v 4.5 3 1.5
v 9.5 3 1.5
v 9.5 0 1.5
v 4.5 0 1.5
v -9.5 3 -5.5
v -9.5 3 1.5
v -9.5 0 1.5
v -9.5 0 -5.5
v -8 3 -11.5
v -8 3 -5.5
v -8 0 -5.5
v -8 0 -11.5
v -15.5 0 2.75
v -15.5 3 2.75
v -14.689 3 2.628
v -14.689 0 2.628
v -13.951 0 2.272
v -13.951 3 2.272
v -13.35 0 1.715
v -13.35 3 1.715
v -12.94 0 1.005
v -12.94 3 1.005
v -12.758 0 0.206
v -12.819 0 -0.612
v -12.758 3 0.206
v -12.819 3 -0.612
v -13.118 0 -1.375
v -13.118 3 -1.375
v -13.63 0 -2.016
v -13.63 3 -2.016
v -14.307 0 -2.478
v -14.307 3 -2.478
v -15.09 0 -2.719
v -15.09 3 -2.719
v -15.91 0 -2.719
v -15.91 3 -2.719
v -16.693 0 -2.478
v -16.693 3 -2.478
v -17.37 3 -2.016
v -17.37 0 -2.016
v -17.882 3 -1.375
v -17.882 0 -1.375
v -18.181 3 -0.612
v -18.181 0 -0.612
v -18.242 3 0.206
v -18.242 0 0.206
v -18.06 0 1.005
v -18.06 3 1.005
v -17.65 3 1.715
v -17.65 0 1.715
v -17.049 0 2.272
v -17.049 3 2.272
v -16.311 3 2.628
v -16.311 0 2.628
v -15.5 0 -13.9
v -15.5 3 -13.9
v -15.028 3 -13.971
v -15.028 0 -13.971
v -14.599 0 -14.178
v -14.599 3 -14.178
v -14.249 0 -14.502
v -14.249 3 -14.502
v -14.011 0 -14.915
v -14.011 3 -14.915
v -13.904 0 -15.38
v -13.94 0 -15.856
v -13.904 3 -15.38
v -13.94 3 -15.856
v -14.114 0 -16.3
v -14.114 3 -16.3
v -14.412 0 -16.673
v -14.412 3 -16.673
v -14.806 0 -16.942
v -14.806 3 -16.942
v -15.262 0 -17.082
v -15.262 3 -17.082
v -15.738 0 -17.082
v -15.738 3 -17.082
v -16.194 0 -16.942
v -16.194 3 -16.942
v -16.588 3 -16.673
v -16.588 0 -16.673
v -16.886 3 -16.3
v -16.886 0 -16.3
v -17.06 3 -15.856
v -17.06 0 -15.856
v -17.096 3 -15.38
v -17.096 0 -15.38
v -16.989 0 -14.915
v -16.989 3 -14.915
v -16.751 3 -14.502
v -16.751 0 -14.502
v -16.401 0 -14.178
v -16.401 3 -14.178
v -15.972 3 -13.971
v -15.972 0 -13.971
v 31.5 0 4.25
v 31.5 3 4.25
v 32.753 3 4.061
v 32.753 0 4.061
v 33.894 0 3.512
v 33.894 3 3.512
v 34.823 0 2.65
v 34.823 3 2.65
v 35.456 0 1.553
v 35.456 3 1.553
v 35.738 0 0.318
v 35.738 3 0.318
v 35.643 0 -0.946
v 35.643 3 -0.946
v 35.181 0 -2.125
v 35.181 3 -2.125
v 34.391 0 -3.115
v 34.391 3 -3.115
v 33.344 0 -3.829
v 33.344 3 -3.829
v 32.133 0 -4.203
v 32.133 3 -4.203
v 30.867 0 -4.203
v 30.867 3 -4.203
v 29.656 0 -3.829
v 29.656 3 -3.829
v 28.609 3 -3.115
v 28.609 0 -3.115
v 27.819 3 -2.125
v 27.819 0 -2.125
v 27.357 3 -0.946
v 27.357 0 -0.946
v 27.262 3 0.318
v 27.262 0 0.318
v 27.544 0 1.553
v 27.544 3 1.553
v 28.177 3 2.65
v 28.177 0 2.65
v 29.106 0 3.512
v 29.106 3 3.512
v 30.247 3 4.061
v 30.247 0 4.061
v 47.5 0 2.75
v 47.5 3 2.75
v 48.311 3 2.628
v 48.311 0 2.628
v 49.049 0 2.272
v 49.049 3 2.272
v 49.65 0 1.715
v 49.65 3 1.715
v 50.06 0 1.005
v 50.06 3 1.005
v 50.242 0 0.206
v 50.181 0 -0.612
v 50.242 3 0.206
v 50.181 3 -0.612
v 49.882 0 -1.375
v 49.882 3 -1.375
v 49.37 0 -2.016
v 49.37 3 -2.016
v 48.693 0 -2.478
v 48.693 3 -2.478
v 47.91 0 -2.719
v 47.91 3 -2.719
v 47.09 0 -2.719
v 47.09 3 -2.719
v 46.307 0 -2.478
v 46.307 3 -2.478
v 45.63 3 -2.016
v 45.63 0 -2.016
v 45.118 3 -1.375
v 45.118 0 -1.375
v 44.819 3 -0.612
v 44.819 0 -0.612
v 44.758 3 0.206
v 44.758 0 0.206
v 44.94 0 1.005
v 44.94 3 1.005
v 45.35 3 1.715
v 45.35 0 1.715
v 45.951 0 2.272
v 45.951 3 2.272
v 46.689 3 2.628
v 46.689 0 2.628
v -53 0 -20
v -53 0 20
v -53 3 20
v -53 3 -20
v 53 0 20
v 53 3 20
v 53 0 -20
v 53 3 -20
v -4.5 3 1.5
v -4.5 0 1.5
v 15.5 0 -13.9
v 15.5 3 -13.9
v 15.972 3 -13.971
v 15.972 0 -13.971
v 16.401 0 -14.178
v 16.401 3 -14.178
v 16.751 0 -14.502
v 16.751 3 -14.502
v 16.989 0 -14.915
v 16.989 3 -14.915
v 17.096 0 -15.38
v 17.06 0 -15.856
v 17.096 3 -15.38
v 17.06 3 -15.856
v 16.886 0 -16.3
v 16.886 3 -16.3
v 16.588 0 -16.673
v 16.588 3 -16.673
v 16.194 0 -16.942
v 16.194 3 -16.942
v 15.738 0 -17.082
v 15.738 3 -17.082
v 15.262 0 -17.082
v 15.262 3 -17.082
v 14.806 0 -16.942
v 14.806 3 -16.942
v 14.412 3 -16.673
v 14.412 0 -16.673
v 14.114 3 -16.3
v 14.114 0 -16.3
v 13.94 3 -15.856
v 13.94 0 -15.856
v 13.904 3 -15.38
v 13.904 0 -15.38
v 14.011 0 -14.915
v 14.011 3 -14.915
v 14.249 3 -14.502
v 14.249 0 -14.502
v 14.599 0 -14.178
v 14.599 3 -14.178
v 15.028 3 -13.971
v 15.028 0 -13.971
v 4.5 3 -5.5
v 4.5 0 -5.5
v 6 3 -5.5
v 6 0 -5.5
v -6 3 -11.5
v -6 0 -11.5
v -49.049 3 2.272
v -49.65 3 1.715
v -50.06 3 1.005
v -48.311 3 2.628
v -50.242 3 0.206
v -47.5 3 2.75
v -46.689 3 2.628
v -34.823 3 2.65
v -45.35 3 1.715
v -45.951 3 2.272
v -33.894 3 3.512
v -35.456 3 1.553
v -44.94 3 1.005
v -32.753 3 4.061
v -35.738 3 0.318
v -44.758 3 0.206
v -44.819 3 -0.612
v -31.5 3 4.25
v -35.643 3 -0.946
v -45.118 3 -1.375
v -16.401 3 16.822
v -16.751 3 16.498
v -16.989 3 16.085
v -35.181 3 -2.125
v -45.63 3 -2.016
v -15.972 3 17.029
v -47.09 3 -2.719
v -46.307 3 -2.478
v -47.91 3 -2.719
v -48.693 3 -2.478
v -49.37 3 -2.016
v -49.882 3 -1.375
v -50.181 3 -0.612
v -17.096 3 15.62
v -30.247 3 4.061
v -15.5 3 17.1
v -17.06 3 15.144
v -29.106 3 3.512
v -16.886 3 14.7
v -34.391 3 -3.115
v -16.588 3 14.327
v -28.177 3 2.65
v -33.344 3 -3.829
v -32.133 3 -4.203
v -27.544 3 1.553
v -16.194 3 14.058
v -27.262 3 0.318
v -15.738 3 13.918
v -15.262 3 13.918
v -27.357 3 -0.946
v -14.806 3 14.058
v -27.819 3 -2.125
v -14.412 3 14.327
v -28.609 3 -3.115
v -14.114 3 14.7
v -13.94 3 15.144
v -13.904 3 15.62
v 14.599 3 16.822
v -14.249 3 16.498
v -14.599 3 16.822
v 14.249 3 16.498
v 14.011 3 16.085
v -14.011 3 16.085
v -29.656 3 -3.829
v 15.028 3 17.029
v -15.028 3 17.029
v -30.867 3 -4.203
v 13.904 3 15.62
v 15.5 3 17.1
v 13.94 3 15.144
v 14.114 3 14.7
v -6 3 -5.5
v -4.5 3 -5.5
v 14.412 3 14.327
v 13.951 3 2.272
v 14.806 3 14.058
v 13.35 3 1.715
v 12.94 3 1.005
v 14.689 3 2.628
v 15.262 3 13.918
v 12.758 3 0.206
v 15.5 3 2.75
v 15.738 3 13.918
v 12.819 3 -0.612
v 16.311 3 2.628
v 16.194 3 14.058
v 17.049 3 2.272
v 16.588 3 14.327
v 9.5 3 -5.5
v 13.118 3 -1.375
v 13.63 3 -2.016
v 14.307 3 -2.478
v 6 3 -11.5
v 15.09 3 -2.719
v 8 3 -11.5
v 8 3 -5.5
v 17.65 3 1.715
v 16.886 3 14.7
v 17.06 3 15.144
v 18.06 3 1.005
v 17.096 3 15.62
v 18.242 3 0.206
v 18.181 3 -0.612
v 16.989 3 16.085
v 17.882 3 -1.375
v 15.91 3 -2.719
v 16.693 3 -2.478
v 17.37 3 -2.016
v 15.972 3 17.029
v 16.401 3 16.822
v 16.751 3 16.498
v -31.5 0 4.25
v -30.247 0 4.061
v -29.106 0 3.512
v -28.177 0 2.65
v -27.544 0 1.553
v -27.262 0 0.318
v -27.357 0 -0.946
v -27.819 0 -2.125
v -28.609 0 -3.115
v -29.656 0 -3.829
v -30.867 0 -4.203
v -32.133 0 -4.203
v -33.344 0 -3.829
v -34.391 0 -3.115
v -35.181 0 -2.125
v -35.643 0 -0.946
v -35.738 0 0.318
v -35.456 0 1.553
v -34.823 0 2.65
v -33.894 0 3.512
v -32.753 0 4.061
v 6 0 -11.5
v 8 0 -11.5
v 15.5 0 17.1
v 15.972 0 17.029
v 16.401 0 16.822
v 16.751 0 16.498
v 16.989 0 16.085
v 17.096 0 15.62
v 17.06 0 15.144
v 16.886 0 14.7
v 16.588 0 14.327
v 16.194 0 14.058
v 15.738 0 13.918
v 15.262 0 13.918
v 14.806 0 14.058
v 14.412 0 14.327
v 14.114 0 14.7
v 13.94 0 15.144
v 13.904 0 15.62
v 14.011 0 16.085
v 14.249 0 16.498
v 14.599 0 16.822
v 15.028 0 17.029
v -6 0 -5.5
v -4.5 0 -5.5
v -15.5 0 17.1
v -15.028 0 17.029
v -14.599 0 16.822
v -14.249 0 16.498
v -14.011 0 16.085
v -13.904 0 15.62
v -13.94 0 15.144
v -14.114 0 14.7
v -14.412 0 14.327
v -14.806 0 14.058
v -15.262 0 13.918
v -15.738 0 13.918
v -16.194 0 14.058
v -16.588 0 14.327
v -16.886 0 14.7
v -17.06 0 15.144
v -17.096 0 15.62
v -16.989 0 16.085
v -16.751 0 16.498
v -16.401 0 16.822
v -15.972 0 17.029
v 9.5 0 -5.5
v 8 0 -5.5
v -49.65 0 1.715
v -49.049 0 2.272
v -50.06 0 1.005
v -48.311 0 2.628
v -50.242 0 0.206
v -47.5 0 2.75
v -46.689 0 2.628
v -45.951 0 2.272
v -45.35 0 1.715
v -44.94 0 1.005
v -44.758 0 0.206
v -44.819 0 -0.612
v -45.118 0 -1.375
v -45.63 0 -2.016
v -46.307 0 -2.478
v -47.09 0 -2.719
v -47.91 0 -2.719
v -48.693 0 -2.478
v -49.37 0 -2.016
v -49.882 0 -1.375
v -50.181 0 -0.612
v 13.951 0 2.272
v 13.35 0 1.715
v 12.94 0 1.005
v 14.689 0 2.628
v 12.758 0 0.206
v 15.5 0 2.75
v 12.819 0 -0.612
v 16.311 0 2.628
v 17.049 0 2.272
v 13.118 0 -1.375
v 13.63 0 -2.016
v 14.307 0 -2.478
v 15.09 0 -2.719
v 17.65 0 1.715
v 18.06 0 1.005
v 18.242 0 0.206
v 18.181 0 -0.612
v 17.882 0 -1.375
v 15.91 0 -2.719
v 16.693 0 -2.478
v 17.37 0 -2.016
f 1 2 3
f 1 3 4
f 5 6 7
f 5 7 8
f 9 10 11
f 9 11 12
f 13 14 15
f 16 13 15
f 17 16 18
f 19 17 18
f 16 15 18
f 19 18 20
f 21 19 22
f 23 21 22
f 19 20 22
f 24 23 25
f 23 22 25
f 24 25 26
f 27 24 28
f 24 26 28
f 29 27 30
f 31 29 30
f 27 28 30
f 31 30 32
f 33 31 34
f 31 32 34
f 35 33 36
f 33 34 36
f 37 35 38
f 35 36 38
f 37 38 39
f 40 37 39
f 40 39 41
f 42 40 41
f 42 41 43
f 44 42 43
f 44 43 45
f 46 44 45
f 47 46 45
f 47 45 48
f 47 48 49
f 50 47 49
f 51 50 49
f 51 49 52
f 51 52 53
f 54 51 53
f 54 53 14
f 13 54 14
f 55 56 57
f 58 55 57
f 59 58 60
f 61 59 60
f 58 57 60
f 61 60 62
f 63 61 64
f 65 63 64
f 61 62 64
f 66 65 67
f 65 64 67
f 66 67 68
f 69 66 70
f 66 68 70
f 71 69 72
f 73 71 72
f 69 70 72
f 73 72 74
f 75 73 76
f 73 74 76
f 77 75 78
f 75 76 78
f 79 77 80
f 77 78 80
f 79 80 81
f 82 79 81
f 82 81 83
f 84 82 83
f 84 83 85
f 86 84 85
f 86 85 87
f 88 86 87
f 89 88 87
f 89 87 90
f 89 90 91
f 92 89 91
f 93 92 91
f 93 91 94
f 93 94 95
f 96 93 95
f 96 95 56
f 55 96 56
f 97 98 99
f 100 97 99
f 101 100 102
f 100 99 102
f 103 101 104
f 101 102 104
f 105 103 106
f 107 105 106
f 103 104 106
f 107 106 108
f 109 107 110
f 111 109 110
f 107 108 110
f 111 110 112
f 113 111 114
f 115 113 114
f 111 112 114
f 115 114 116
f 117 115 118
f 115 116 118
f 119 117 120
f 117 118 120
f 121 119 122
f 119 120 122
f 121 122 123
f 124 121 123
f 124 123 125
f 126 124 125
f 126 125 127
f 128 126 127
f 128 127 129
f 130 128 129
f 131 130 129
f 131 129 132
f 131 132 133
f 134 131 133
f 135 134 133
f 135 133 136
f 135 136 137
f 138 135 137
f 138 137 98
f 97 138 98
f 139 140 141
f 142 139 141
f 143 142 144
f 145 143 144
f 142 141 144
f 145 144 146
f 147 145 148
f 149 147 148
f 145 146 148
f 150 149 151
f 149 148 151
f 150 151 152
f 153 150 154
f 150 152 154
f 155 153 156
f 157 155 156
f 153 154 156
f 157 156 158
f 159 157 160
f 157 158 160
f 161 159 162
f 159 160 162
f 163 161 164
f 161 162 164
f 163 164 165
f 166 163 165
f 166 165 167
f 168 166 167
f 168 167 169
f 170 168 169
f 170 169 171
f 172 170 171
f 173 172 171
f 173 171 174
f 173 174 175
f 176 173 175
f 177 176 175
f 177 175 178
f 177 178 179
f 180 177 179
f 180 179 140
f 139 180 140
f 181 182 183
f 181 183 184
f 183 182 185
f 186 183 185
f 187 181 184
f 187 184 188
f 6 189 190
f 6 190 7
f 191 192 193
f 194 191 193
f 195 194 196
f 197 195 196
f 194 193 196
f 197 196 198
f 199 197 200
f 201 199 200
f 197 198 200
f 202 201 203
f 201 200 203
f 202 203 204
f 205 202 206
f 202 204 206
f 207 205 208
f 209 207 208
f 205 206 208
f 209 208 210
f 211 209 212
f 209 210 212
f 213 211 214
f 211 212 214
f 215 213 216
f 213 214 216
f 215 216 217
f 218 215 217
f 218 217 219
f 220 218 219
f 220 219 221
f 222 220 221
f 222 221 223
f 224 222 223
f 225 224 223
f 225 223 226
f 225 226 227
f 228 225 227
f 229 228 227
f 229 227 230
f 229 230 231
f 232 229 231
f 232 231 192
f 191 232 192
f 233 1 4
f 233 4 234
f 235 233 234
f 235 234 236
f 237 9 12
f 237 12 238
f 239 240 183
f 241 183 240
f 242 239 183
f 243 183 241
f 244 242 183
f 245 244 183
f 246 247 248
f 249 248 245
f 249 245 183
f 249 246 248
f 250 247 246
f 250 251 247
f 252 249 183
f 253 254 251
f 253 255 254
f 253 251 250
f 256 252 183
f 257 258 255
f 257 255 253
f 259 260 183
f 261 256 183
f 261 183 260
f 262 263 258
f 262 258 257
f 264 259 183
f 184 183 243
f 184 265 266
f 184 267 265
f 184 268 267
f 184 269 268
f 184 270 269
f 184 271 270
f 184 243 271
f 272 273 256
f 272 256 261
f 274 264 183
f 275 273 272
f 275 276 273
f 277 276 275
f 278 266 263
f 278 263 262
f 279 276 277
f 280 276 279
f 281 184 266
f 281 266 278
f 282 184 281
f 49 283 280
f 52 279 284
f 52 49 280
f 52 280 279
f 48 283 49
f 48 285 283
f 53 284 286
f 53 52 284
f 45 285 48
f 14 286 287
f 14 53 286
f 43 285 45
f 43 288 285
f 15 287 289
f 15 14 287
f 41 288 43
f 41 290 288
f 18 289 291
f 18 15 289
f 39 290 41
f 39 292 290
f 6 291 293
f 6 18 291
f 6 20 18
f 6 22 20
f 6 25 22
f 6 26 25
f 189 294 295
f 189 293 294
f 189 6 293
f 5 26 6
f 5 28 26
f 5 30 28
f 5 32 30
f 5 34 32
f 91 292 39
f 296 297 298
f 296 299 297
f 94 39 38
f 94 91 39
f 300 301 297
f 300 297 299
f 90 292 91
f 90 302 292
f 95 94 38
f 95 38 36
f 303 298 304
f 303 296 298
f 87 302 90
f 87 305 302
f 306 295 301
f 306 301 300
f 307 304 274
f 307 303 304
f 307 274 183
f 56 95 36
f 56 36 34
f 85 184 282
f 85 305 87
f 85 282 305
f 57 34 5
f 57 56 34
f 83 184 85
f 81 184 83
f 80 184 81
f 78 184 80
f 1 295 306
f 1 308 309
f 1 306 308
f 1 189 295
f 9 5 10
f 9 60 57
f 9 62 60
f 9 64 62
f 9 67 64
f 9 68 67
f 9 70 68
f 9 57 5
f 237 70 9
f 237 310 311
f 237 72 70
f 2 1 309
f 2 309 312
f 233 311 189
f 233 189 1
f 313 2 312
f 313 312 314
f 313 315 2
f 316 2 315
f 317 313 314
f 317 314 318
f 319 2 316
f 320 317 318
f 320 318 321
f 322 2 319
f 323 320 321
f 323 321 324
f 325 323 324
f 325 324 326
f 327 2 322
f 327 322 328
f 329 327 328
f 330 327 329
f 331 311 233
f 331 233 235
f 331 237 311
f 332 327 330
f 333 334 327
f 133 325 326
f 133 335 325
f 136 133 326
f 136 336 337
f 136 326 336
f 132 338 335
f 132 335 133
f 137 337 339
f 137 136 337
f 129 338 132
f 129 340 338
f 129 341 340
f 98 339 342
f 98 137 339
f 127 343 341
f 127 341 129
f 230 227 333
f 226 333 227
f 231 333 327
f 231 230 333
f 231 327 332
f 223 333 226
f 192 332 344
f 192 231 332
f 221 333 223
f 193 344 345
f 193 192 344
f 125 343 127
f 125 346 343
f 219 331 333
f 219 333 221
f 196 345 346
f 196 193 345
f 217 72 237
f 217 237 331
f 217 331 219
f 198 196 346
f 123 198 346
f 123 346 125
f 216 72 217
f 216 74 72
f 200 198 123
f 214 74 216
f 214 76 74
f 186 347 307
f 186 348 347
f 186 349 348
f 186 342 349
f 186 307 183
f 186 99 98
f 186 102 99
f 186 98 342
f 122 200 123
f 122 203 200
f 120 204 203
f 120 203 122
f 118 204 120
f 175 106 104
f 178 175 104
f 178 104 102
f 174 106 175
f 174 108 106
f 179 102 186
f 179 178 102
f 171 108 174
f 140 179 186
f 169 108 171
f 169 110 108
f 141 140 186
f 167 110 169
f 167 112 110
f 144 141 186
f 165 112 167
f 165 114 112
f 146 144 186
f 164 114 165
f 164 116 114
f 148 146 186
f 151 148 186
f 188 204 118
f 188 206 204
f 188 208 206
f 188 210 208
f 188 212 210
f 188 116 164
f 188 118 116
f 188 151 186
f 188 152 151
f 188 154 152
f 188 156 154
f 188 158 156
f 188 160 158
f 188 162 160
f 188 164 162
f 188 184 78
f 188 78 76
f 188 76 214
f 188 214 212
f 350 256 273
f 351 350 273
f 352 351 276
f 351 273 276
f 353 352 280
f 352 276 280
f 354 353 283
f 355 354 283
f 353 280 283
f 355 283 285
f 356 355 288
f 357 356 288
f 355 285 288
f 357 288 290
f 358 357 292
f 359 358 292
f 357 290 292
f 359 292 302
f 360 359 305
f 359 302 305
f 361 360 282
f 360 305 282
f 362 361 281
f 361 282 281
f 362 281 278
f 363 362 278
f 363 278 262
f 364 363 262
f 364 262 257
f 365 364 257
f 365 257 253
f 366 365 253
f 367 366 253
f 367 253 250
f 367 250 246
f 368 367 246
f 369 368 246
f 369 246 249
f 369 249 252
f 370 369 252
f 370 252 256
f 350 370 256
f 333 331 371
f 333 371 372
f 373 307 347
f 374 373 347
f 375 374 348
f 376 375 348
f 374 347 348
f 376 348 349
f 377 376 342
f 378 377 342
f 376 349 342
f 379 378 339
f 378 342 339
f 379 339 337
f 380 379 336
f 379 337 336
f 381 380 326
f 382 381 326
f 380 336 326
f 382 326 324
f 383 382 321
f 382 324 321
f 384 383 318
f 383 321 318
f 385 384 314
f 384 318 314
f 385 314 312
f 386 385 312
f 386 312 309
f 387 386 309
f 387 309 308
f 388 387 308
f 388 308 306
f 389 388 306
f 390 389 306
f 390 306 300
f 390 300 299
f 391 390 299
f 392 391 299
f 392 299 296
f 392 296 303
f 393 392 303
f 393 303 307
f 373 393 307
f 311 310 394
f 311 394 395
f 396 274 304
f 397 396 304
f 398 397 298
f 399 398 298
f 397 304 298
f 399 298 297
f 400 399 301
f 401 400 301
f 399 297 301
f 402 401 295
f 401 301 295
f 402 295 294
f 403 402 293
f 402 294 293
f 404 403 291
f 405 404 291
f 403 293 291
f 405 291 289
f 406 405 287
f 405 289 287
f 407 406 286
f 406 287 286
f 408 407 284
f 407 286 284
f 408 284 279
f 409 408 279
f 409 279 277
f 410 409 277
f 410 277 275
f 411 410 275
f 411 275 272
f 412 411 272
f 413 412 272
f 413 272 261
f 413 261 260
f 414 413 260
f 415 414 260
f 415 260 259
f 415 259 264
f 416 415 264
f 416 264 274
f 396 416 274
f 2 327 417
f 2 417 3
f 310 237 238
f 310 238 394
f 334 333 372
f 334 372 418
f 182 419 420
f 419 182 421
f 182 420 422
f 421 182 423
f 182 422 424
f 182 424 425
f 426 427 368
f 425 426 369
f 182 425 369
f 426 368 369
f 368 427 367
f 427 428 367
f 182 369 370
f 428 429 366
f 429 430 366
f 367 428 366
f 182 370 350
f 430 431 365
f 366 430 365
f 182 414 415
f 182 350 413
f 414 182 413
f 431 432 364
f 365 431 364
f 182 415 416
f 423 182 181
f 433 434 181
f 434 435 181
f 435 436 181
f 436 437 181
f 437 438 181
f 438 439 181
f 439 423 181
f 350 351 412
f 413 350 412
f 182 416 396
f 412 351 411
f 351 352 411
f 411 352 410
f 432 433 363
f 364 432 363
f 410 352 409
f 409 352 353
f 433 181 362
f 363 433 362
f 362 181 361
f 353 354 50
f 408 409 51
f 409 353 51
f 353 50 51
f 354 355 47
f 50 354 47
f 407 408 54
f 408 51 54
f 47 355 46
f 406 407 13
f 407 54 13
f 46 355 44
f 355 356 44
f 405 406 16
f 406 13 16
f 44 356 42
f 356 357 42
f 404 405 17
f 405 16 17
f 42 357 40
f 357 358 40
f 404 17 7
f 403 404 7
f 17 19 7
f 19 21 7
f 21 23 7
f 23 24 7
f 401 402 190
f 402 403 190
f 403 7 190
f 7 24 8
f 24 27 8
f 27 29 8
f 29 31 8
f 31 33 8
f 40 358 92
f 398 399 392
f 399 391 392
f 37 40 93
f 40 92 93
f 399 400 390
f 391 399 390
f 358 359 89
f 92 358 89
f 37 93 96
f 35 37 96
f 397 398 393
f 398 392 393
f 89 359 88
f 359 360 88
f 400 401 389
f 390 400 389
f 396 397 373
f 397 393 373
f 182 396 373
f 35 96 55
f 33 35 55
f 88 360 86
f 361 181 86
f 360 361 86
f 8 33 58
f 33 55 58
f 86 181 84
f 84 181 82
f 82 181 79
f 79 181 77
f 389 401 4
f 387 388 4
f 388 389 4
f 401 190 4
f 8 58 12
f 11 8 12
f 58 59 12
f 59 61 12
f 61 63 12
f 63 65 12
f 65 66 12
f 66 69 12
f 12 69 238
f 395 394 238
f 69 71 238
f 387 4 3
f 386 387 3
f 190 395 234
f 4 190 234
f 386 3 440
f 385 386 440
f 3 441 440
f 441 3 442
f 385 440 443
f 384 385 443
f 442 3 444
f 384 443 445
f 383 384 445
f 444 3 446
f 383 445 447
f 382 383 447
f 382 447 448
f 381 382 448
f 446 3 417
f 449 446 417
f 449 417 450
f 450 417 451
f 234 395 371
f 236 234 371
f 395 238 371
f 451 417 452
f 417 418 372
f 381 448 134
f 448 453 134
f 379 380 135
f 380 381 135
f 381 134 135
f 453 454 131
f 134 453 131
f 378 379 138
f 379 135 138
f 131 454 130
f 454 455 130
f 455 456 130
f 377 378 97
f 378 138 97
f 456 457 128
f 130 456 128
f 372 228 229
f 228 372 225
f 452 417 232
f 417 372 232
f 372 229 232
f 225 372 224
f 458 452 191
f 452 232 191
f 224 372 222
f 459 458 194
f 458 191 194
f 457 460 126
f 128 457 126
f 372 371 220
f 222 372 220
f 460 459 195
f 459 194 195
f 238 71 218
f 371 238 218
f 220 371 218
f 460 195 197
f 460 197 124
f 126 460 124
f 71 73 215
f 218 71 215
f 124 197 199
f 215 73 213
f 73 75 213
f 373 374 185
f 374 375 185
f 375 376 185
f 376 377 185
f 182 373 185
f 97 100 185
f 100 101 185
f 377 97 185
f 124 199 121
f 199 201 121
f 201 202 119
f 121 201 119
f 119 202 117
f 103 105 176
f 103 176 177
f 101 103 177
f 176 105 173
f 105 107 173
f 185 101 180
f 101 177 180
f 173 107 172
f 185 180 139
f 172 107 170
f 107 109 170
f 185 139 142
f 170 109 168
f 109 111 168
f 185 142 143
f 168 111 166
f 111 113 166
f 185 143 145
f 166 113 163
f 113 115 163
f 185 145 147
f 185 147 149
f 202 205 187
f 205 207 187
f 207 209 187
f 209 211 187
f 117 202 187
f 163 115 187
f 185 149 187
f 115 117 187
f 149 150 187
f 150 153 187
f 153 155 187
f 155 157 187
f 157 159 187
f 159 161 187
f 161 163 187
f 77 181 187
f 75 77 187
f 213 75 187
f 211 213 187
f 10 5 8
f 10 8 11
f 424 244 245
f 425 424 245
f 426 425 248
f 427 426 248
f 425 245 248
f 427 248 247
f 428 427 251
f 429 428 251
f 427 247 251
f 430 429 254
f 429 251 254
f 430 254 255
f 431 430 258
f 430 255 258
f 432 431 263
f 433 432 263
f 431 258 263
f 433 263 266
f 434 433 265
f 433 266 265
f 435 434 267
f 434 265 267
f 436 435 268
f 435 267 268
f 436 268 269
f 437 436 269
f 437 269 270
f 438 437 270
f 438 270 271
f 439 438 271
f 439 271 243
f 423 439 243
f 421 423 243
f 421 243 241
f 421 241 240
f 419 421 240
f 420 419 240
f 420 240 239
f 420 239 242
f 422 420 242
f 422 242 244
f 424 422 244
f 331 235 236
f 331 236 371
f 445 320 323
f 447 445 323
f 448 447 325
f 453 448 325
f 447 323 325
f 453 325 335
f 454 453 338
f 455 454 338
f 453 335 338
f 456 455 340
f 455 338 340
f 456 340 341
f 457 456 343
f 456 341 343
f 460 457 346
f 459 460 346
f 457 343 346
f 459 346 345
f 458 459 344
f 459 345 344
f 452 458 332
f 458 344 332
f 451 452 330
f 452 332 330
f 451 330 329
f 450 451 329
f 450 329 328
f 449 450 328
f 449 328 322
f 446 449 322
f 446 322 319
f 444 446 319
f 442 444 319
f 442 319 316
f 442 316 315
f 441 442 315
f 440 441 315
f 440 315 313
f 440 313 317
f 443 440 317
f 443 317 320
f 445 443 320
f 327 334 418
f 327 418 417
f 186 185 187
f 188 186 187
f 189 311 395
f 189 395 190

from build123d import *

# Parameters (mm, degrees)
SKETCH_1_W          = 106
SKETCH_1_H          = 40
EXTRUDE_1_DEPTH     = 3
CUT_EXTRUDE_1_REACH = 58.727
SKETCH_2_R          = 4.25
SKETCH_2_R_2        = 2.75
CUT_EXTRUDE_2_REACH = 58.727
SKETCH_3_R          = 1.6
CUT_EXTRUDE_3_REACH = 58.727


with BuildPart() as part:
    # 草图1 → 凸台-拉伸1 (new body)
    with BuildSketch(Plane(origin=(0, 0, 0), x_dir=(1, 0, 0), z_dir=(0, 1, 0))):
        Rectangle(SKETCH_1_W, SKETCH_1_H)
    extrude(amount=EXTRUDE_1_DEPTH)

    # 草图2 → 切除-拉伸1 (cut, up to next)
    with BuildSketch(Plane(origin=(0, 3, 0), x_dir=(1, 0, 0), z_dir=(0, 1, 0)), mode=Mode.PRIVATE) as cut_extrude_1_sk1:
        with Locations(Location((-31.5, 0, 0), (0, 0, 270))):
            Circle(SKETCH_2_R)
    cut_extrude_1_tool1 = extrude(cut_extrude_1_sk1.sketch, amount=-CUT_EXTRUDE_1_REACH, mode=Mode.PRIVATE) & part.part
    # 草图2 → 切除-拉伸1 (cut, up to next)
    with BuildSketch(Plane(origin=(0, 3, 0), x_dir=(1, 0, 0), z_dir=(0, 1, 0)), mode=Mode.PRIVATE) as cut_extrude_1_sk2:
        with Locations(Location((31.5, 0, 0), (0, 0, 270))):
            Circle(SKETCH_2_R)
    cut_extrude_1_tool2 = extrude(cut_extrude_1_sk2.sketch, amount=-CUT_EXTRUDE_1_REACH, mode=Mode.PRIVATE) & part.part
    # 草图2 → 切除-拉伸1 (cut, up to next)
    with BuildSketch(Plane(origin=(0, 3, 0), x_dir=(1, 0, 0), z_dir=(0, 1, 0)), mode=Mode.PRIVATE) as cut_extrude_1_sk3:
        with Locations(Location((-47.5, 0, 0), (0, 0, 270))):
            Circle(SKETCH_2_R_2)
    cut_extrude_1_tool3 = extrude(cut_extrude_1_sk3.sketch, amount=-CUT_EXTRUDE_1_REACH, mode=Mode.PRIVATE) & part.part
    # 草图2 → 切除-拉伸1 (cut, up to next)
    with BuildSketch(Plane(origin=(0, 3, 0), x_dir=(1, 0, 0), z_dir=(0, 1, 0)), mode=Mode.PRIVATE) as cut_extrude_1_sk4:
        with Locations(Location((-15.5, 0, 0), (0, 0, 270))):
            Circle(SKETCH_2_R_2)
    cut_extrude_1_tool4 = extrude(cut_extrude_1_sk4.sketch, amount=-CUT_EXTRUDE_1_REACH, mode=Mode.PRIVATE) & part.part
    # 草图2 → 切除-拉伸1 (cut, up to next)
    with BuildSketch(Plane(origin=(0, 3, 0), x_dir=(1, 0, 0), z_dir=(0, 1, 0)), mode=Mode.PRIVATE) as cut_extrude_1_sk5:
        with Locations(Location((15.5, 0, 0), (0, 0, 270))):
            Circle(SKETCH_2_R_2)
    cut_extrude_1_tool5 = extrude(cut_extrude_1_sk5.sketch, amount=-CUT_EXTRUDE_1_REACH, mode=Mode.PRIVATE) & part.part
    # 草图2 → 切除-拉伸1 (cut, up to next)
    with BuildSketch(Plane(origin=(0, 3, 0), x_dir=(1, 0, 0), z_dir=(0, 1, 0)), mode=Mode.PRIVATE) as cut_extrude_1_sk6:
        with Locations(Location((47.5, 0, 0), (0, 0, 270))):
            Circle(SKETCH_2_R_2)
    cut_extrude_1_tool6 = extrude(cut_extrude_1_sk6.sketch, amount=-CUT_EXTRUDE_1_REACH, mode=Mode.PRIVATE) & part.part
    add(cut_extrude_1_tool1.solids().sort_by_distance((-31.5, 3, 0))[0], mode=Mode.SUBTRACT)
    add(cut_extrude_1_tool2.solids().sort_by_distance((31.5, 3, 0))[0], mode=Mode.SUBTRACT)
    add(cut_extrude_1_tool3.solids().sort_by_distance((-47.5, 3, 0))[0], mode=Mode.SUBTRACT)
    add(cut_extrude_1_tool4.solids().sort_by_distance((-15.5, 3, 0))[0], mode=Mode.SUBTRACT)
    add(cut_extrude_1_tool5.solids().sort_by_distance((15.5, 3, 0))[0], mode=Mode.SUBTRACT)
    add(cut_extrude_1_tool6.solids().sort_by_distance((47.5, 3, 0))[0], mode=Mode.SUBTRACT)

    # 草图3 → 切除-拉伸2 (cut, up to next)
    with BuildSketch(Plane(origin=(0, 3, 0), x_dir=(1, 0, 0), z_dir=(0, 1, 0)), mode=Mode.PRIVATE) as cut_extrude_2_sk1:
        with Locations(Location((-15.5, -15.5, 0), (0, 0, 270))):
            Circle(SKETCH_3_R)
    cut_extrude_2_tool1 = extrude(cut_extrude_2_sk1.sketch, amount=-CUT_EXTRUDE_2_REACH, mode=Mode.PRIVATE) & part.part
    # 草图3 → 切除-拉伸2 (cut, up to next)
    with BuildSketch(Plane(origin=(0, 3, 0), x_dir=(1, 0, 0), z_dir=(0, 1, 0)), mode=Mode.PRIVATE) as cut_extrude_2_sk2:
        with Locations(Location((-15.5, 15.5, 0), (0, 0, 270))):
            Circle(SKETCH_3_R)
    cut_extrude_2_tool2 = extrude(cut_extrude_2_sk2.sketch, amount=-CUT_EXTRUDE_2_REACH, mode=Mode.PRIVATE) & part.part
    # 草图3 → 切除-拉伸2 (cut, up to next)
    with BuildSketch(Plane(origin=(0, 3, 0), x_dir=(1, 0, 0), z_dir=(0, 1, 0)), mode=Mode.PRIVATE) as cut_extrude_2_sk3:
        with Locations(Location((15.5, 15.5, 0), (0, 0, 270))):
            Circle(SKETCH_3_R)
    cut_extrude_2_tool3 = extrude(cut_extrude_2_sk3.sketch, amount=-CUT_EXTRUDE_2_REACH, mode=Mode.PRIVATE) & part.part
    # 草图3 → 切除-拉伸2 (cut, up to next)
    with BuildSketch(Plane(origin=(0, 3, 0), x_dir=(1, 0, 0), z_dir=(0, 1, 0)), mode=Mode.PRIVATE) as cut_extrude_2_sk4:
        with Locations(Location((15.5, -15.5, 0), (0, 0, 270))):
            Circle(SKETCH_3_R)
    cut_extrude_2_tool4 = extrude(cut_extrude_2_sk4.sketch, amount=-CUT_EXTRUDE_2_REACH, mode=Mode.PRIVATE) & part.part
    add(cut_extrude_2_tool1.solids().sort_by_distance((-15.5, 3, 15.5))[0], mode=Mode.SUBTRACT)
    add(cut_extrude_2_tool2.solids().sort_by_distance((-15.5, 3, -15.5))[0], mode=Mode.SUBTRACT)
    add(cut_extrude_2_tool3.solids().sort_by_distance((15.5, 3, -15.5))[0], mode=Mode.SUBTRACT)
    add(cut_extrude_2_tool4.solids().sort_by_distance((15.5, 3, 15.5))[0], mode=Mode.SUBTRACT)

    # 草图4 → 切除-拉伸3 (cut, up to next)
    with BuildSketch(Plane(origin=(0, 3, 0), x_dir=(1, 0, 0), z_dir=(0, 1, 0)), mode=Mode.PRIVATE) as cut_extrude_3_sk1:
        Polygon((-6, 5.5), (-4.5, 5.5), (-4.5, -1.5), (-9.5, -1.5), (-9.5, 5.5), (-8, 5.5), (-8, 11.5), (-6, 11.5), align=None)
    cut_extrude_3_tool1 = extrude(cut_extrude_3_sk1.sketch, amount=-CUT_EXTRUDE_3_REACH, mode=Mode.PRIVATE) & part.part
    # 草图4 → 切除-拉伸3 (cut, up to next)
    with BuildSketch(Plane(origin=(0, 3, 0), x_dir=(1, 0, 0), z_dir=(0, 1, 0)), mode=Mode.PRIVATE) as cut_extrude_3_sk2:
        Polygon((8, 11.5), (8, 5.5), (9.5, 5.5), (9.5, -1.5), (4.5, -1.5), (4.5, 5.5), (6, 5.5), (6, 11.5), align=None)
    cut_extrude_3_tool2 = extrude(cut_extrude_3_sk2.sketch, amount=-CUT_EXTRUDE_3_REACH, mode=Mode.PRIVATE) & part.part
    add(cut_extrude_3_tool1.solids().sort_by_distance((-7, 3, -3.659574))[0], mode=Mode.SUBTRACT)
    add(cut_extrude_3_tool2.solids().sort_by_distance((7, 3, -3.659574))[0], mode=Mode.SUBTRACT)


solid = part.part
